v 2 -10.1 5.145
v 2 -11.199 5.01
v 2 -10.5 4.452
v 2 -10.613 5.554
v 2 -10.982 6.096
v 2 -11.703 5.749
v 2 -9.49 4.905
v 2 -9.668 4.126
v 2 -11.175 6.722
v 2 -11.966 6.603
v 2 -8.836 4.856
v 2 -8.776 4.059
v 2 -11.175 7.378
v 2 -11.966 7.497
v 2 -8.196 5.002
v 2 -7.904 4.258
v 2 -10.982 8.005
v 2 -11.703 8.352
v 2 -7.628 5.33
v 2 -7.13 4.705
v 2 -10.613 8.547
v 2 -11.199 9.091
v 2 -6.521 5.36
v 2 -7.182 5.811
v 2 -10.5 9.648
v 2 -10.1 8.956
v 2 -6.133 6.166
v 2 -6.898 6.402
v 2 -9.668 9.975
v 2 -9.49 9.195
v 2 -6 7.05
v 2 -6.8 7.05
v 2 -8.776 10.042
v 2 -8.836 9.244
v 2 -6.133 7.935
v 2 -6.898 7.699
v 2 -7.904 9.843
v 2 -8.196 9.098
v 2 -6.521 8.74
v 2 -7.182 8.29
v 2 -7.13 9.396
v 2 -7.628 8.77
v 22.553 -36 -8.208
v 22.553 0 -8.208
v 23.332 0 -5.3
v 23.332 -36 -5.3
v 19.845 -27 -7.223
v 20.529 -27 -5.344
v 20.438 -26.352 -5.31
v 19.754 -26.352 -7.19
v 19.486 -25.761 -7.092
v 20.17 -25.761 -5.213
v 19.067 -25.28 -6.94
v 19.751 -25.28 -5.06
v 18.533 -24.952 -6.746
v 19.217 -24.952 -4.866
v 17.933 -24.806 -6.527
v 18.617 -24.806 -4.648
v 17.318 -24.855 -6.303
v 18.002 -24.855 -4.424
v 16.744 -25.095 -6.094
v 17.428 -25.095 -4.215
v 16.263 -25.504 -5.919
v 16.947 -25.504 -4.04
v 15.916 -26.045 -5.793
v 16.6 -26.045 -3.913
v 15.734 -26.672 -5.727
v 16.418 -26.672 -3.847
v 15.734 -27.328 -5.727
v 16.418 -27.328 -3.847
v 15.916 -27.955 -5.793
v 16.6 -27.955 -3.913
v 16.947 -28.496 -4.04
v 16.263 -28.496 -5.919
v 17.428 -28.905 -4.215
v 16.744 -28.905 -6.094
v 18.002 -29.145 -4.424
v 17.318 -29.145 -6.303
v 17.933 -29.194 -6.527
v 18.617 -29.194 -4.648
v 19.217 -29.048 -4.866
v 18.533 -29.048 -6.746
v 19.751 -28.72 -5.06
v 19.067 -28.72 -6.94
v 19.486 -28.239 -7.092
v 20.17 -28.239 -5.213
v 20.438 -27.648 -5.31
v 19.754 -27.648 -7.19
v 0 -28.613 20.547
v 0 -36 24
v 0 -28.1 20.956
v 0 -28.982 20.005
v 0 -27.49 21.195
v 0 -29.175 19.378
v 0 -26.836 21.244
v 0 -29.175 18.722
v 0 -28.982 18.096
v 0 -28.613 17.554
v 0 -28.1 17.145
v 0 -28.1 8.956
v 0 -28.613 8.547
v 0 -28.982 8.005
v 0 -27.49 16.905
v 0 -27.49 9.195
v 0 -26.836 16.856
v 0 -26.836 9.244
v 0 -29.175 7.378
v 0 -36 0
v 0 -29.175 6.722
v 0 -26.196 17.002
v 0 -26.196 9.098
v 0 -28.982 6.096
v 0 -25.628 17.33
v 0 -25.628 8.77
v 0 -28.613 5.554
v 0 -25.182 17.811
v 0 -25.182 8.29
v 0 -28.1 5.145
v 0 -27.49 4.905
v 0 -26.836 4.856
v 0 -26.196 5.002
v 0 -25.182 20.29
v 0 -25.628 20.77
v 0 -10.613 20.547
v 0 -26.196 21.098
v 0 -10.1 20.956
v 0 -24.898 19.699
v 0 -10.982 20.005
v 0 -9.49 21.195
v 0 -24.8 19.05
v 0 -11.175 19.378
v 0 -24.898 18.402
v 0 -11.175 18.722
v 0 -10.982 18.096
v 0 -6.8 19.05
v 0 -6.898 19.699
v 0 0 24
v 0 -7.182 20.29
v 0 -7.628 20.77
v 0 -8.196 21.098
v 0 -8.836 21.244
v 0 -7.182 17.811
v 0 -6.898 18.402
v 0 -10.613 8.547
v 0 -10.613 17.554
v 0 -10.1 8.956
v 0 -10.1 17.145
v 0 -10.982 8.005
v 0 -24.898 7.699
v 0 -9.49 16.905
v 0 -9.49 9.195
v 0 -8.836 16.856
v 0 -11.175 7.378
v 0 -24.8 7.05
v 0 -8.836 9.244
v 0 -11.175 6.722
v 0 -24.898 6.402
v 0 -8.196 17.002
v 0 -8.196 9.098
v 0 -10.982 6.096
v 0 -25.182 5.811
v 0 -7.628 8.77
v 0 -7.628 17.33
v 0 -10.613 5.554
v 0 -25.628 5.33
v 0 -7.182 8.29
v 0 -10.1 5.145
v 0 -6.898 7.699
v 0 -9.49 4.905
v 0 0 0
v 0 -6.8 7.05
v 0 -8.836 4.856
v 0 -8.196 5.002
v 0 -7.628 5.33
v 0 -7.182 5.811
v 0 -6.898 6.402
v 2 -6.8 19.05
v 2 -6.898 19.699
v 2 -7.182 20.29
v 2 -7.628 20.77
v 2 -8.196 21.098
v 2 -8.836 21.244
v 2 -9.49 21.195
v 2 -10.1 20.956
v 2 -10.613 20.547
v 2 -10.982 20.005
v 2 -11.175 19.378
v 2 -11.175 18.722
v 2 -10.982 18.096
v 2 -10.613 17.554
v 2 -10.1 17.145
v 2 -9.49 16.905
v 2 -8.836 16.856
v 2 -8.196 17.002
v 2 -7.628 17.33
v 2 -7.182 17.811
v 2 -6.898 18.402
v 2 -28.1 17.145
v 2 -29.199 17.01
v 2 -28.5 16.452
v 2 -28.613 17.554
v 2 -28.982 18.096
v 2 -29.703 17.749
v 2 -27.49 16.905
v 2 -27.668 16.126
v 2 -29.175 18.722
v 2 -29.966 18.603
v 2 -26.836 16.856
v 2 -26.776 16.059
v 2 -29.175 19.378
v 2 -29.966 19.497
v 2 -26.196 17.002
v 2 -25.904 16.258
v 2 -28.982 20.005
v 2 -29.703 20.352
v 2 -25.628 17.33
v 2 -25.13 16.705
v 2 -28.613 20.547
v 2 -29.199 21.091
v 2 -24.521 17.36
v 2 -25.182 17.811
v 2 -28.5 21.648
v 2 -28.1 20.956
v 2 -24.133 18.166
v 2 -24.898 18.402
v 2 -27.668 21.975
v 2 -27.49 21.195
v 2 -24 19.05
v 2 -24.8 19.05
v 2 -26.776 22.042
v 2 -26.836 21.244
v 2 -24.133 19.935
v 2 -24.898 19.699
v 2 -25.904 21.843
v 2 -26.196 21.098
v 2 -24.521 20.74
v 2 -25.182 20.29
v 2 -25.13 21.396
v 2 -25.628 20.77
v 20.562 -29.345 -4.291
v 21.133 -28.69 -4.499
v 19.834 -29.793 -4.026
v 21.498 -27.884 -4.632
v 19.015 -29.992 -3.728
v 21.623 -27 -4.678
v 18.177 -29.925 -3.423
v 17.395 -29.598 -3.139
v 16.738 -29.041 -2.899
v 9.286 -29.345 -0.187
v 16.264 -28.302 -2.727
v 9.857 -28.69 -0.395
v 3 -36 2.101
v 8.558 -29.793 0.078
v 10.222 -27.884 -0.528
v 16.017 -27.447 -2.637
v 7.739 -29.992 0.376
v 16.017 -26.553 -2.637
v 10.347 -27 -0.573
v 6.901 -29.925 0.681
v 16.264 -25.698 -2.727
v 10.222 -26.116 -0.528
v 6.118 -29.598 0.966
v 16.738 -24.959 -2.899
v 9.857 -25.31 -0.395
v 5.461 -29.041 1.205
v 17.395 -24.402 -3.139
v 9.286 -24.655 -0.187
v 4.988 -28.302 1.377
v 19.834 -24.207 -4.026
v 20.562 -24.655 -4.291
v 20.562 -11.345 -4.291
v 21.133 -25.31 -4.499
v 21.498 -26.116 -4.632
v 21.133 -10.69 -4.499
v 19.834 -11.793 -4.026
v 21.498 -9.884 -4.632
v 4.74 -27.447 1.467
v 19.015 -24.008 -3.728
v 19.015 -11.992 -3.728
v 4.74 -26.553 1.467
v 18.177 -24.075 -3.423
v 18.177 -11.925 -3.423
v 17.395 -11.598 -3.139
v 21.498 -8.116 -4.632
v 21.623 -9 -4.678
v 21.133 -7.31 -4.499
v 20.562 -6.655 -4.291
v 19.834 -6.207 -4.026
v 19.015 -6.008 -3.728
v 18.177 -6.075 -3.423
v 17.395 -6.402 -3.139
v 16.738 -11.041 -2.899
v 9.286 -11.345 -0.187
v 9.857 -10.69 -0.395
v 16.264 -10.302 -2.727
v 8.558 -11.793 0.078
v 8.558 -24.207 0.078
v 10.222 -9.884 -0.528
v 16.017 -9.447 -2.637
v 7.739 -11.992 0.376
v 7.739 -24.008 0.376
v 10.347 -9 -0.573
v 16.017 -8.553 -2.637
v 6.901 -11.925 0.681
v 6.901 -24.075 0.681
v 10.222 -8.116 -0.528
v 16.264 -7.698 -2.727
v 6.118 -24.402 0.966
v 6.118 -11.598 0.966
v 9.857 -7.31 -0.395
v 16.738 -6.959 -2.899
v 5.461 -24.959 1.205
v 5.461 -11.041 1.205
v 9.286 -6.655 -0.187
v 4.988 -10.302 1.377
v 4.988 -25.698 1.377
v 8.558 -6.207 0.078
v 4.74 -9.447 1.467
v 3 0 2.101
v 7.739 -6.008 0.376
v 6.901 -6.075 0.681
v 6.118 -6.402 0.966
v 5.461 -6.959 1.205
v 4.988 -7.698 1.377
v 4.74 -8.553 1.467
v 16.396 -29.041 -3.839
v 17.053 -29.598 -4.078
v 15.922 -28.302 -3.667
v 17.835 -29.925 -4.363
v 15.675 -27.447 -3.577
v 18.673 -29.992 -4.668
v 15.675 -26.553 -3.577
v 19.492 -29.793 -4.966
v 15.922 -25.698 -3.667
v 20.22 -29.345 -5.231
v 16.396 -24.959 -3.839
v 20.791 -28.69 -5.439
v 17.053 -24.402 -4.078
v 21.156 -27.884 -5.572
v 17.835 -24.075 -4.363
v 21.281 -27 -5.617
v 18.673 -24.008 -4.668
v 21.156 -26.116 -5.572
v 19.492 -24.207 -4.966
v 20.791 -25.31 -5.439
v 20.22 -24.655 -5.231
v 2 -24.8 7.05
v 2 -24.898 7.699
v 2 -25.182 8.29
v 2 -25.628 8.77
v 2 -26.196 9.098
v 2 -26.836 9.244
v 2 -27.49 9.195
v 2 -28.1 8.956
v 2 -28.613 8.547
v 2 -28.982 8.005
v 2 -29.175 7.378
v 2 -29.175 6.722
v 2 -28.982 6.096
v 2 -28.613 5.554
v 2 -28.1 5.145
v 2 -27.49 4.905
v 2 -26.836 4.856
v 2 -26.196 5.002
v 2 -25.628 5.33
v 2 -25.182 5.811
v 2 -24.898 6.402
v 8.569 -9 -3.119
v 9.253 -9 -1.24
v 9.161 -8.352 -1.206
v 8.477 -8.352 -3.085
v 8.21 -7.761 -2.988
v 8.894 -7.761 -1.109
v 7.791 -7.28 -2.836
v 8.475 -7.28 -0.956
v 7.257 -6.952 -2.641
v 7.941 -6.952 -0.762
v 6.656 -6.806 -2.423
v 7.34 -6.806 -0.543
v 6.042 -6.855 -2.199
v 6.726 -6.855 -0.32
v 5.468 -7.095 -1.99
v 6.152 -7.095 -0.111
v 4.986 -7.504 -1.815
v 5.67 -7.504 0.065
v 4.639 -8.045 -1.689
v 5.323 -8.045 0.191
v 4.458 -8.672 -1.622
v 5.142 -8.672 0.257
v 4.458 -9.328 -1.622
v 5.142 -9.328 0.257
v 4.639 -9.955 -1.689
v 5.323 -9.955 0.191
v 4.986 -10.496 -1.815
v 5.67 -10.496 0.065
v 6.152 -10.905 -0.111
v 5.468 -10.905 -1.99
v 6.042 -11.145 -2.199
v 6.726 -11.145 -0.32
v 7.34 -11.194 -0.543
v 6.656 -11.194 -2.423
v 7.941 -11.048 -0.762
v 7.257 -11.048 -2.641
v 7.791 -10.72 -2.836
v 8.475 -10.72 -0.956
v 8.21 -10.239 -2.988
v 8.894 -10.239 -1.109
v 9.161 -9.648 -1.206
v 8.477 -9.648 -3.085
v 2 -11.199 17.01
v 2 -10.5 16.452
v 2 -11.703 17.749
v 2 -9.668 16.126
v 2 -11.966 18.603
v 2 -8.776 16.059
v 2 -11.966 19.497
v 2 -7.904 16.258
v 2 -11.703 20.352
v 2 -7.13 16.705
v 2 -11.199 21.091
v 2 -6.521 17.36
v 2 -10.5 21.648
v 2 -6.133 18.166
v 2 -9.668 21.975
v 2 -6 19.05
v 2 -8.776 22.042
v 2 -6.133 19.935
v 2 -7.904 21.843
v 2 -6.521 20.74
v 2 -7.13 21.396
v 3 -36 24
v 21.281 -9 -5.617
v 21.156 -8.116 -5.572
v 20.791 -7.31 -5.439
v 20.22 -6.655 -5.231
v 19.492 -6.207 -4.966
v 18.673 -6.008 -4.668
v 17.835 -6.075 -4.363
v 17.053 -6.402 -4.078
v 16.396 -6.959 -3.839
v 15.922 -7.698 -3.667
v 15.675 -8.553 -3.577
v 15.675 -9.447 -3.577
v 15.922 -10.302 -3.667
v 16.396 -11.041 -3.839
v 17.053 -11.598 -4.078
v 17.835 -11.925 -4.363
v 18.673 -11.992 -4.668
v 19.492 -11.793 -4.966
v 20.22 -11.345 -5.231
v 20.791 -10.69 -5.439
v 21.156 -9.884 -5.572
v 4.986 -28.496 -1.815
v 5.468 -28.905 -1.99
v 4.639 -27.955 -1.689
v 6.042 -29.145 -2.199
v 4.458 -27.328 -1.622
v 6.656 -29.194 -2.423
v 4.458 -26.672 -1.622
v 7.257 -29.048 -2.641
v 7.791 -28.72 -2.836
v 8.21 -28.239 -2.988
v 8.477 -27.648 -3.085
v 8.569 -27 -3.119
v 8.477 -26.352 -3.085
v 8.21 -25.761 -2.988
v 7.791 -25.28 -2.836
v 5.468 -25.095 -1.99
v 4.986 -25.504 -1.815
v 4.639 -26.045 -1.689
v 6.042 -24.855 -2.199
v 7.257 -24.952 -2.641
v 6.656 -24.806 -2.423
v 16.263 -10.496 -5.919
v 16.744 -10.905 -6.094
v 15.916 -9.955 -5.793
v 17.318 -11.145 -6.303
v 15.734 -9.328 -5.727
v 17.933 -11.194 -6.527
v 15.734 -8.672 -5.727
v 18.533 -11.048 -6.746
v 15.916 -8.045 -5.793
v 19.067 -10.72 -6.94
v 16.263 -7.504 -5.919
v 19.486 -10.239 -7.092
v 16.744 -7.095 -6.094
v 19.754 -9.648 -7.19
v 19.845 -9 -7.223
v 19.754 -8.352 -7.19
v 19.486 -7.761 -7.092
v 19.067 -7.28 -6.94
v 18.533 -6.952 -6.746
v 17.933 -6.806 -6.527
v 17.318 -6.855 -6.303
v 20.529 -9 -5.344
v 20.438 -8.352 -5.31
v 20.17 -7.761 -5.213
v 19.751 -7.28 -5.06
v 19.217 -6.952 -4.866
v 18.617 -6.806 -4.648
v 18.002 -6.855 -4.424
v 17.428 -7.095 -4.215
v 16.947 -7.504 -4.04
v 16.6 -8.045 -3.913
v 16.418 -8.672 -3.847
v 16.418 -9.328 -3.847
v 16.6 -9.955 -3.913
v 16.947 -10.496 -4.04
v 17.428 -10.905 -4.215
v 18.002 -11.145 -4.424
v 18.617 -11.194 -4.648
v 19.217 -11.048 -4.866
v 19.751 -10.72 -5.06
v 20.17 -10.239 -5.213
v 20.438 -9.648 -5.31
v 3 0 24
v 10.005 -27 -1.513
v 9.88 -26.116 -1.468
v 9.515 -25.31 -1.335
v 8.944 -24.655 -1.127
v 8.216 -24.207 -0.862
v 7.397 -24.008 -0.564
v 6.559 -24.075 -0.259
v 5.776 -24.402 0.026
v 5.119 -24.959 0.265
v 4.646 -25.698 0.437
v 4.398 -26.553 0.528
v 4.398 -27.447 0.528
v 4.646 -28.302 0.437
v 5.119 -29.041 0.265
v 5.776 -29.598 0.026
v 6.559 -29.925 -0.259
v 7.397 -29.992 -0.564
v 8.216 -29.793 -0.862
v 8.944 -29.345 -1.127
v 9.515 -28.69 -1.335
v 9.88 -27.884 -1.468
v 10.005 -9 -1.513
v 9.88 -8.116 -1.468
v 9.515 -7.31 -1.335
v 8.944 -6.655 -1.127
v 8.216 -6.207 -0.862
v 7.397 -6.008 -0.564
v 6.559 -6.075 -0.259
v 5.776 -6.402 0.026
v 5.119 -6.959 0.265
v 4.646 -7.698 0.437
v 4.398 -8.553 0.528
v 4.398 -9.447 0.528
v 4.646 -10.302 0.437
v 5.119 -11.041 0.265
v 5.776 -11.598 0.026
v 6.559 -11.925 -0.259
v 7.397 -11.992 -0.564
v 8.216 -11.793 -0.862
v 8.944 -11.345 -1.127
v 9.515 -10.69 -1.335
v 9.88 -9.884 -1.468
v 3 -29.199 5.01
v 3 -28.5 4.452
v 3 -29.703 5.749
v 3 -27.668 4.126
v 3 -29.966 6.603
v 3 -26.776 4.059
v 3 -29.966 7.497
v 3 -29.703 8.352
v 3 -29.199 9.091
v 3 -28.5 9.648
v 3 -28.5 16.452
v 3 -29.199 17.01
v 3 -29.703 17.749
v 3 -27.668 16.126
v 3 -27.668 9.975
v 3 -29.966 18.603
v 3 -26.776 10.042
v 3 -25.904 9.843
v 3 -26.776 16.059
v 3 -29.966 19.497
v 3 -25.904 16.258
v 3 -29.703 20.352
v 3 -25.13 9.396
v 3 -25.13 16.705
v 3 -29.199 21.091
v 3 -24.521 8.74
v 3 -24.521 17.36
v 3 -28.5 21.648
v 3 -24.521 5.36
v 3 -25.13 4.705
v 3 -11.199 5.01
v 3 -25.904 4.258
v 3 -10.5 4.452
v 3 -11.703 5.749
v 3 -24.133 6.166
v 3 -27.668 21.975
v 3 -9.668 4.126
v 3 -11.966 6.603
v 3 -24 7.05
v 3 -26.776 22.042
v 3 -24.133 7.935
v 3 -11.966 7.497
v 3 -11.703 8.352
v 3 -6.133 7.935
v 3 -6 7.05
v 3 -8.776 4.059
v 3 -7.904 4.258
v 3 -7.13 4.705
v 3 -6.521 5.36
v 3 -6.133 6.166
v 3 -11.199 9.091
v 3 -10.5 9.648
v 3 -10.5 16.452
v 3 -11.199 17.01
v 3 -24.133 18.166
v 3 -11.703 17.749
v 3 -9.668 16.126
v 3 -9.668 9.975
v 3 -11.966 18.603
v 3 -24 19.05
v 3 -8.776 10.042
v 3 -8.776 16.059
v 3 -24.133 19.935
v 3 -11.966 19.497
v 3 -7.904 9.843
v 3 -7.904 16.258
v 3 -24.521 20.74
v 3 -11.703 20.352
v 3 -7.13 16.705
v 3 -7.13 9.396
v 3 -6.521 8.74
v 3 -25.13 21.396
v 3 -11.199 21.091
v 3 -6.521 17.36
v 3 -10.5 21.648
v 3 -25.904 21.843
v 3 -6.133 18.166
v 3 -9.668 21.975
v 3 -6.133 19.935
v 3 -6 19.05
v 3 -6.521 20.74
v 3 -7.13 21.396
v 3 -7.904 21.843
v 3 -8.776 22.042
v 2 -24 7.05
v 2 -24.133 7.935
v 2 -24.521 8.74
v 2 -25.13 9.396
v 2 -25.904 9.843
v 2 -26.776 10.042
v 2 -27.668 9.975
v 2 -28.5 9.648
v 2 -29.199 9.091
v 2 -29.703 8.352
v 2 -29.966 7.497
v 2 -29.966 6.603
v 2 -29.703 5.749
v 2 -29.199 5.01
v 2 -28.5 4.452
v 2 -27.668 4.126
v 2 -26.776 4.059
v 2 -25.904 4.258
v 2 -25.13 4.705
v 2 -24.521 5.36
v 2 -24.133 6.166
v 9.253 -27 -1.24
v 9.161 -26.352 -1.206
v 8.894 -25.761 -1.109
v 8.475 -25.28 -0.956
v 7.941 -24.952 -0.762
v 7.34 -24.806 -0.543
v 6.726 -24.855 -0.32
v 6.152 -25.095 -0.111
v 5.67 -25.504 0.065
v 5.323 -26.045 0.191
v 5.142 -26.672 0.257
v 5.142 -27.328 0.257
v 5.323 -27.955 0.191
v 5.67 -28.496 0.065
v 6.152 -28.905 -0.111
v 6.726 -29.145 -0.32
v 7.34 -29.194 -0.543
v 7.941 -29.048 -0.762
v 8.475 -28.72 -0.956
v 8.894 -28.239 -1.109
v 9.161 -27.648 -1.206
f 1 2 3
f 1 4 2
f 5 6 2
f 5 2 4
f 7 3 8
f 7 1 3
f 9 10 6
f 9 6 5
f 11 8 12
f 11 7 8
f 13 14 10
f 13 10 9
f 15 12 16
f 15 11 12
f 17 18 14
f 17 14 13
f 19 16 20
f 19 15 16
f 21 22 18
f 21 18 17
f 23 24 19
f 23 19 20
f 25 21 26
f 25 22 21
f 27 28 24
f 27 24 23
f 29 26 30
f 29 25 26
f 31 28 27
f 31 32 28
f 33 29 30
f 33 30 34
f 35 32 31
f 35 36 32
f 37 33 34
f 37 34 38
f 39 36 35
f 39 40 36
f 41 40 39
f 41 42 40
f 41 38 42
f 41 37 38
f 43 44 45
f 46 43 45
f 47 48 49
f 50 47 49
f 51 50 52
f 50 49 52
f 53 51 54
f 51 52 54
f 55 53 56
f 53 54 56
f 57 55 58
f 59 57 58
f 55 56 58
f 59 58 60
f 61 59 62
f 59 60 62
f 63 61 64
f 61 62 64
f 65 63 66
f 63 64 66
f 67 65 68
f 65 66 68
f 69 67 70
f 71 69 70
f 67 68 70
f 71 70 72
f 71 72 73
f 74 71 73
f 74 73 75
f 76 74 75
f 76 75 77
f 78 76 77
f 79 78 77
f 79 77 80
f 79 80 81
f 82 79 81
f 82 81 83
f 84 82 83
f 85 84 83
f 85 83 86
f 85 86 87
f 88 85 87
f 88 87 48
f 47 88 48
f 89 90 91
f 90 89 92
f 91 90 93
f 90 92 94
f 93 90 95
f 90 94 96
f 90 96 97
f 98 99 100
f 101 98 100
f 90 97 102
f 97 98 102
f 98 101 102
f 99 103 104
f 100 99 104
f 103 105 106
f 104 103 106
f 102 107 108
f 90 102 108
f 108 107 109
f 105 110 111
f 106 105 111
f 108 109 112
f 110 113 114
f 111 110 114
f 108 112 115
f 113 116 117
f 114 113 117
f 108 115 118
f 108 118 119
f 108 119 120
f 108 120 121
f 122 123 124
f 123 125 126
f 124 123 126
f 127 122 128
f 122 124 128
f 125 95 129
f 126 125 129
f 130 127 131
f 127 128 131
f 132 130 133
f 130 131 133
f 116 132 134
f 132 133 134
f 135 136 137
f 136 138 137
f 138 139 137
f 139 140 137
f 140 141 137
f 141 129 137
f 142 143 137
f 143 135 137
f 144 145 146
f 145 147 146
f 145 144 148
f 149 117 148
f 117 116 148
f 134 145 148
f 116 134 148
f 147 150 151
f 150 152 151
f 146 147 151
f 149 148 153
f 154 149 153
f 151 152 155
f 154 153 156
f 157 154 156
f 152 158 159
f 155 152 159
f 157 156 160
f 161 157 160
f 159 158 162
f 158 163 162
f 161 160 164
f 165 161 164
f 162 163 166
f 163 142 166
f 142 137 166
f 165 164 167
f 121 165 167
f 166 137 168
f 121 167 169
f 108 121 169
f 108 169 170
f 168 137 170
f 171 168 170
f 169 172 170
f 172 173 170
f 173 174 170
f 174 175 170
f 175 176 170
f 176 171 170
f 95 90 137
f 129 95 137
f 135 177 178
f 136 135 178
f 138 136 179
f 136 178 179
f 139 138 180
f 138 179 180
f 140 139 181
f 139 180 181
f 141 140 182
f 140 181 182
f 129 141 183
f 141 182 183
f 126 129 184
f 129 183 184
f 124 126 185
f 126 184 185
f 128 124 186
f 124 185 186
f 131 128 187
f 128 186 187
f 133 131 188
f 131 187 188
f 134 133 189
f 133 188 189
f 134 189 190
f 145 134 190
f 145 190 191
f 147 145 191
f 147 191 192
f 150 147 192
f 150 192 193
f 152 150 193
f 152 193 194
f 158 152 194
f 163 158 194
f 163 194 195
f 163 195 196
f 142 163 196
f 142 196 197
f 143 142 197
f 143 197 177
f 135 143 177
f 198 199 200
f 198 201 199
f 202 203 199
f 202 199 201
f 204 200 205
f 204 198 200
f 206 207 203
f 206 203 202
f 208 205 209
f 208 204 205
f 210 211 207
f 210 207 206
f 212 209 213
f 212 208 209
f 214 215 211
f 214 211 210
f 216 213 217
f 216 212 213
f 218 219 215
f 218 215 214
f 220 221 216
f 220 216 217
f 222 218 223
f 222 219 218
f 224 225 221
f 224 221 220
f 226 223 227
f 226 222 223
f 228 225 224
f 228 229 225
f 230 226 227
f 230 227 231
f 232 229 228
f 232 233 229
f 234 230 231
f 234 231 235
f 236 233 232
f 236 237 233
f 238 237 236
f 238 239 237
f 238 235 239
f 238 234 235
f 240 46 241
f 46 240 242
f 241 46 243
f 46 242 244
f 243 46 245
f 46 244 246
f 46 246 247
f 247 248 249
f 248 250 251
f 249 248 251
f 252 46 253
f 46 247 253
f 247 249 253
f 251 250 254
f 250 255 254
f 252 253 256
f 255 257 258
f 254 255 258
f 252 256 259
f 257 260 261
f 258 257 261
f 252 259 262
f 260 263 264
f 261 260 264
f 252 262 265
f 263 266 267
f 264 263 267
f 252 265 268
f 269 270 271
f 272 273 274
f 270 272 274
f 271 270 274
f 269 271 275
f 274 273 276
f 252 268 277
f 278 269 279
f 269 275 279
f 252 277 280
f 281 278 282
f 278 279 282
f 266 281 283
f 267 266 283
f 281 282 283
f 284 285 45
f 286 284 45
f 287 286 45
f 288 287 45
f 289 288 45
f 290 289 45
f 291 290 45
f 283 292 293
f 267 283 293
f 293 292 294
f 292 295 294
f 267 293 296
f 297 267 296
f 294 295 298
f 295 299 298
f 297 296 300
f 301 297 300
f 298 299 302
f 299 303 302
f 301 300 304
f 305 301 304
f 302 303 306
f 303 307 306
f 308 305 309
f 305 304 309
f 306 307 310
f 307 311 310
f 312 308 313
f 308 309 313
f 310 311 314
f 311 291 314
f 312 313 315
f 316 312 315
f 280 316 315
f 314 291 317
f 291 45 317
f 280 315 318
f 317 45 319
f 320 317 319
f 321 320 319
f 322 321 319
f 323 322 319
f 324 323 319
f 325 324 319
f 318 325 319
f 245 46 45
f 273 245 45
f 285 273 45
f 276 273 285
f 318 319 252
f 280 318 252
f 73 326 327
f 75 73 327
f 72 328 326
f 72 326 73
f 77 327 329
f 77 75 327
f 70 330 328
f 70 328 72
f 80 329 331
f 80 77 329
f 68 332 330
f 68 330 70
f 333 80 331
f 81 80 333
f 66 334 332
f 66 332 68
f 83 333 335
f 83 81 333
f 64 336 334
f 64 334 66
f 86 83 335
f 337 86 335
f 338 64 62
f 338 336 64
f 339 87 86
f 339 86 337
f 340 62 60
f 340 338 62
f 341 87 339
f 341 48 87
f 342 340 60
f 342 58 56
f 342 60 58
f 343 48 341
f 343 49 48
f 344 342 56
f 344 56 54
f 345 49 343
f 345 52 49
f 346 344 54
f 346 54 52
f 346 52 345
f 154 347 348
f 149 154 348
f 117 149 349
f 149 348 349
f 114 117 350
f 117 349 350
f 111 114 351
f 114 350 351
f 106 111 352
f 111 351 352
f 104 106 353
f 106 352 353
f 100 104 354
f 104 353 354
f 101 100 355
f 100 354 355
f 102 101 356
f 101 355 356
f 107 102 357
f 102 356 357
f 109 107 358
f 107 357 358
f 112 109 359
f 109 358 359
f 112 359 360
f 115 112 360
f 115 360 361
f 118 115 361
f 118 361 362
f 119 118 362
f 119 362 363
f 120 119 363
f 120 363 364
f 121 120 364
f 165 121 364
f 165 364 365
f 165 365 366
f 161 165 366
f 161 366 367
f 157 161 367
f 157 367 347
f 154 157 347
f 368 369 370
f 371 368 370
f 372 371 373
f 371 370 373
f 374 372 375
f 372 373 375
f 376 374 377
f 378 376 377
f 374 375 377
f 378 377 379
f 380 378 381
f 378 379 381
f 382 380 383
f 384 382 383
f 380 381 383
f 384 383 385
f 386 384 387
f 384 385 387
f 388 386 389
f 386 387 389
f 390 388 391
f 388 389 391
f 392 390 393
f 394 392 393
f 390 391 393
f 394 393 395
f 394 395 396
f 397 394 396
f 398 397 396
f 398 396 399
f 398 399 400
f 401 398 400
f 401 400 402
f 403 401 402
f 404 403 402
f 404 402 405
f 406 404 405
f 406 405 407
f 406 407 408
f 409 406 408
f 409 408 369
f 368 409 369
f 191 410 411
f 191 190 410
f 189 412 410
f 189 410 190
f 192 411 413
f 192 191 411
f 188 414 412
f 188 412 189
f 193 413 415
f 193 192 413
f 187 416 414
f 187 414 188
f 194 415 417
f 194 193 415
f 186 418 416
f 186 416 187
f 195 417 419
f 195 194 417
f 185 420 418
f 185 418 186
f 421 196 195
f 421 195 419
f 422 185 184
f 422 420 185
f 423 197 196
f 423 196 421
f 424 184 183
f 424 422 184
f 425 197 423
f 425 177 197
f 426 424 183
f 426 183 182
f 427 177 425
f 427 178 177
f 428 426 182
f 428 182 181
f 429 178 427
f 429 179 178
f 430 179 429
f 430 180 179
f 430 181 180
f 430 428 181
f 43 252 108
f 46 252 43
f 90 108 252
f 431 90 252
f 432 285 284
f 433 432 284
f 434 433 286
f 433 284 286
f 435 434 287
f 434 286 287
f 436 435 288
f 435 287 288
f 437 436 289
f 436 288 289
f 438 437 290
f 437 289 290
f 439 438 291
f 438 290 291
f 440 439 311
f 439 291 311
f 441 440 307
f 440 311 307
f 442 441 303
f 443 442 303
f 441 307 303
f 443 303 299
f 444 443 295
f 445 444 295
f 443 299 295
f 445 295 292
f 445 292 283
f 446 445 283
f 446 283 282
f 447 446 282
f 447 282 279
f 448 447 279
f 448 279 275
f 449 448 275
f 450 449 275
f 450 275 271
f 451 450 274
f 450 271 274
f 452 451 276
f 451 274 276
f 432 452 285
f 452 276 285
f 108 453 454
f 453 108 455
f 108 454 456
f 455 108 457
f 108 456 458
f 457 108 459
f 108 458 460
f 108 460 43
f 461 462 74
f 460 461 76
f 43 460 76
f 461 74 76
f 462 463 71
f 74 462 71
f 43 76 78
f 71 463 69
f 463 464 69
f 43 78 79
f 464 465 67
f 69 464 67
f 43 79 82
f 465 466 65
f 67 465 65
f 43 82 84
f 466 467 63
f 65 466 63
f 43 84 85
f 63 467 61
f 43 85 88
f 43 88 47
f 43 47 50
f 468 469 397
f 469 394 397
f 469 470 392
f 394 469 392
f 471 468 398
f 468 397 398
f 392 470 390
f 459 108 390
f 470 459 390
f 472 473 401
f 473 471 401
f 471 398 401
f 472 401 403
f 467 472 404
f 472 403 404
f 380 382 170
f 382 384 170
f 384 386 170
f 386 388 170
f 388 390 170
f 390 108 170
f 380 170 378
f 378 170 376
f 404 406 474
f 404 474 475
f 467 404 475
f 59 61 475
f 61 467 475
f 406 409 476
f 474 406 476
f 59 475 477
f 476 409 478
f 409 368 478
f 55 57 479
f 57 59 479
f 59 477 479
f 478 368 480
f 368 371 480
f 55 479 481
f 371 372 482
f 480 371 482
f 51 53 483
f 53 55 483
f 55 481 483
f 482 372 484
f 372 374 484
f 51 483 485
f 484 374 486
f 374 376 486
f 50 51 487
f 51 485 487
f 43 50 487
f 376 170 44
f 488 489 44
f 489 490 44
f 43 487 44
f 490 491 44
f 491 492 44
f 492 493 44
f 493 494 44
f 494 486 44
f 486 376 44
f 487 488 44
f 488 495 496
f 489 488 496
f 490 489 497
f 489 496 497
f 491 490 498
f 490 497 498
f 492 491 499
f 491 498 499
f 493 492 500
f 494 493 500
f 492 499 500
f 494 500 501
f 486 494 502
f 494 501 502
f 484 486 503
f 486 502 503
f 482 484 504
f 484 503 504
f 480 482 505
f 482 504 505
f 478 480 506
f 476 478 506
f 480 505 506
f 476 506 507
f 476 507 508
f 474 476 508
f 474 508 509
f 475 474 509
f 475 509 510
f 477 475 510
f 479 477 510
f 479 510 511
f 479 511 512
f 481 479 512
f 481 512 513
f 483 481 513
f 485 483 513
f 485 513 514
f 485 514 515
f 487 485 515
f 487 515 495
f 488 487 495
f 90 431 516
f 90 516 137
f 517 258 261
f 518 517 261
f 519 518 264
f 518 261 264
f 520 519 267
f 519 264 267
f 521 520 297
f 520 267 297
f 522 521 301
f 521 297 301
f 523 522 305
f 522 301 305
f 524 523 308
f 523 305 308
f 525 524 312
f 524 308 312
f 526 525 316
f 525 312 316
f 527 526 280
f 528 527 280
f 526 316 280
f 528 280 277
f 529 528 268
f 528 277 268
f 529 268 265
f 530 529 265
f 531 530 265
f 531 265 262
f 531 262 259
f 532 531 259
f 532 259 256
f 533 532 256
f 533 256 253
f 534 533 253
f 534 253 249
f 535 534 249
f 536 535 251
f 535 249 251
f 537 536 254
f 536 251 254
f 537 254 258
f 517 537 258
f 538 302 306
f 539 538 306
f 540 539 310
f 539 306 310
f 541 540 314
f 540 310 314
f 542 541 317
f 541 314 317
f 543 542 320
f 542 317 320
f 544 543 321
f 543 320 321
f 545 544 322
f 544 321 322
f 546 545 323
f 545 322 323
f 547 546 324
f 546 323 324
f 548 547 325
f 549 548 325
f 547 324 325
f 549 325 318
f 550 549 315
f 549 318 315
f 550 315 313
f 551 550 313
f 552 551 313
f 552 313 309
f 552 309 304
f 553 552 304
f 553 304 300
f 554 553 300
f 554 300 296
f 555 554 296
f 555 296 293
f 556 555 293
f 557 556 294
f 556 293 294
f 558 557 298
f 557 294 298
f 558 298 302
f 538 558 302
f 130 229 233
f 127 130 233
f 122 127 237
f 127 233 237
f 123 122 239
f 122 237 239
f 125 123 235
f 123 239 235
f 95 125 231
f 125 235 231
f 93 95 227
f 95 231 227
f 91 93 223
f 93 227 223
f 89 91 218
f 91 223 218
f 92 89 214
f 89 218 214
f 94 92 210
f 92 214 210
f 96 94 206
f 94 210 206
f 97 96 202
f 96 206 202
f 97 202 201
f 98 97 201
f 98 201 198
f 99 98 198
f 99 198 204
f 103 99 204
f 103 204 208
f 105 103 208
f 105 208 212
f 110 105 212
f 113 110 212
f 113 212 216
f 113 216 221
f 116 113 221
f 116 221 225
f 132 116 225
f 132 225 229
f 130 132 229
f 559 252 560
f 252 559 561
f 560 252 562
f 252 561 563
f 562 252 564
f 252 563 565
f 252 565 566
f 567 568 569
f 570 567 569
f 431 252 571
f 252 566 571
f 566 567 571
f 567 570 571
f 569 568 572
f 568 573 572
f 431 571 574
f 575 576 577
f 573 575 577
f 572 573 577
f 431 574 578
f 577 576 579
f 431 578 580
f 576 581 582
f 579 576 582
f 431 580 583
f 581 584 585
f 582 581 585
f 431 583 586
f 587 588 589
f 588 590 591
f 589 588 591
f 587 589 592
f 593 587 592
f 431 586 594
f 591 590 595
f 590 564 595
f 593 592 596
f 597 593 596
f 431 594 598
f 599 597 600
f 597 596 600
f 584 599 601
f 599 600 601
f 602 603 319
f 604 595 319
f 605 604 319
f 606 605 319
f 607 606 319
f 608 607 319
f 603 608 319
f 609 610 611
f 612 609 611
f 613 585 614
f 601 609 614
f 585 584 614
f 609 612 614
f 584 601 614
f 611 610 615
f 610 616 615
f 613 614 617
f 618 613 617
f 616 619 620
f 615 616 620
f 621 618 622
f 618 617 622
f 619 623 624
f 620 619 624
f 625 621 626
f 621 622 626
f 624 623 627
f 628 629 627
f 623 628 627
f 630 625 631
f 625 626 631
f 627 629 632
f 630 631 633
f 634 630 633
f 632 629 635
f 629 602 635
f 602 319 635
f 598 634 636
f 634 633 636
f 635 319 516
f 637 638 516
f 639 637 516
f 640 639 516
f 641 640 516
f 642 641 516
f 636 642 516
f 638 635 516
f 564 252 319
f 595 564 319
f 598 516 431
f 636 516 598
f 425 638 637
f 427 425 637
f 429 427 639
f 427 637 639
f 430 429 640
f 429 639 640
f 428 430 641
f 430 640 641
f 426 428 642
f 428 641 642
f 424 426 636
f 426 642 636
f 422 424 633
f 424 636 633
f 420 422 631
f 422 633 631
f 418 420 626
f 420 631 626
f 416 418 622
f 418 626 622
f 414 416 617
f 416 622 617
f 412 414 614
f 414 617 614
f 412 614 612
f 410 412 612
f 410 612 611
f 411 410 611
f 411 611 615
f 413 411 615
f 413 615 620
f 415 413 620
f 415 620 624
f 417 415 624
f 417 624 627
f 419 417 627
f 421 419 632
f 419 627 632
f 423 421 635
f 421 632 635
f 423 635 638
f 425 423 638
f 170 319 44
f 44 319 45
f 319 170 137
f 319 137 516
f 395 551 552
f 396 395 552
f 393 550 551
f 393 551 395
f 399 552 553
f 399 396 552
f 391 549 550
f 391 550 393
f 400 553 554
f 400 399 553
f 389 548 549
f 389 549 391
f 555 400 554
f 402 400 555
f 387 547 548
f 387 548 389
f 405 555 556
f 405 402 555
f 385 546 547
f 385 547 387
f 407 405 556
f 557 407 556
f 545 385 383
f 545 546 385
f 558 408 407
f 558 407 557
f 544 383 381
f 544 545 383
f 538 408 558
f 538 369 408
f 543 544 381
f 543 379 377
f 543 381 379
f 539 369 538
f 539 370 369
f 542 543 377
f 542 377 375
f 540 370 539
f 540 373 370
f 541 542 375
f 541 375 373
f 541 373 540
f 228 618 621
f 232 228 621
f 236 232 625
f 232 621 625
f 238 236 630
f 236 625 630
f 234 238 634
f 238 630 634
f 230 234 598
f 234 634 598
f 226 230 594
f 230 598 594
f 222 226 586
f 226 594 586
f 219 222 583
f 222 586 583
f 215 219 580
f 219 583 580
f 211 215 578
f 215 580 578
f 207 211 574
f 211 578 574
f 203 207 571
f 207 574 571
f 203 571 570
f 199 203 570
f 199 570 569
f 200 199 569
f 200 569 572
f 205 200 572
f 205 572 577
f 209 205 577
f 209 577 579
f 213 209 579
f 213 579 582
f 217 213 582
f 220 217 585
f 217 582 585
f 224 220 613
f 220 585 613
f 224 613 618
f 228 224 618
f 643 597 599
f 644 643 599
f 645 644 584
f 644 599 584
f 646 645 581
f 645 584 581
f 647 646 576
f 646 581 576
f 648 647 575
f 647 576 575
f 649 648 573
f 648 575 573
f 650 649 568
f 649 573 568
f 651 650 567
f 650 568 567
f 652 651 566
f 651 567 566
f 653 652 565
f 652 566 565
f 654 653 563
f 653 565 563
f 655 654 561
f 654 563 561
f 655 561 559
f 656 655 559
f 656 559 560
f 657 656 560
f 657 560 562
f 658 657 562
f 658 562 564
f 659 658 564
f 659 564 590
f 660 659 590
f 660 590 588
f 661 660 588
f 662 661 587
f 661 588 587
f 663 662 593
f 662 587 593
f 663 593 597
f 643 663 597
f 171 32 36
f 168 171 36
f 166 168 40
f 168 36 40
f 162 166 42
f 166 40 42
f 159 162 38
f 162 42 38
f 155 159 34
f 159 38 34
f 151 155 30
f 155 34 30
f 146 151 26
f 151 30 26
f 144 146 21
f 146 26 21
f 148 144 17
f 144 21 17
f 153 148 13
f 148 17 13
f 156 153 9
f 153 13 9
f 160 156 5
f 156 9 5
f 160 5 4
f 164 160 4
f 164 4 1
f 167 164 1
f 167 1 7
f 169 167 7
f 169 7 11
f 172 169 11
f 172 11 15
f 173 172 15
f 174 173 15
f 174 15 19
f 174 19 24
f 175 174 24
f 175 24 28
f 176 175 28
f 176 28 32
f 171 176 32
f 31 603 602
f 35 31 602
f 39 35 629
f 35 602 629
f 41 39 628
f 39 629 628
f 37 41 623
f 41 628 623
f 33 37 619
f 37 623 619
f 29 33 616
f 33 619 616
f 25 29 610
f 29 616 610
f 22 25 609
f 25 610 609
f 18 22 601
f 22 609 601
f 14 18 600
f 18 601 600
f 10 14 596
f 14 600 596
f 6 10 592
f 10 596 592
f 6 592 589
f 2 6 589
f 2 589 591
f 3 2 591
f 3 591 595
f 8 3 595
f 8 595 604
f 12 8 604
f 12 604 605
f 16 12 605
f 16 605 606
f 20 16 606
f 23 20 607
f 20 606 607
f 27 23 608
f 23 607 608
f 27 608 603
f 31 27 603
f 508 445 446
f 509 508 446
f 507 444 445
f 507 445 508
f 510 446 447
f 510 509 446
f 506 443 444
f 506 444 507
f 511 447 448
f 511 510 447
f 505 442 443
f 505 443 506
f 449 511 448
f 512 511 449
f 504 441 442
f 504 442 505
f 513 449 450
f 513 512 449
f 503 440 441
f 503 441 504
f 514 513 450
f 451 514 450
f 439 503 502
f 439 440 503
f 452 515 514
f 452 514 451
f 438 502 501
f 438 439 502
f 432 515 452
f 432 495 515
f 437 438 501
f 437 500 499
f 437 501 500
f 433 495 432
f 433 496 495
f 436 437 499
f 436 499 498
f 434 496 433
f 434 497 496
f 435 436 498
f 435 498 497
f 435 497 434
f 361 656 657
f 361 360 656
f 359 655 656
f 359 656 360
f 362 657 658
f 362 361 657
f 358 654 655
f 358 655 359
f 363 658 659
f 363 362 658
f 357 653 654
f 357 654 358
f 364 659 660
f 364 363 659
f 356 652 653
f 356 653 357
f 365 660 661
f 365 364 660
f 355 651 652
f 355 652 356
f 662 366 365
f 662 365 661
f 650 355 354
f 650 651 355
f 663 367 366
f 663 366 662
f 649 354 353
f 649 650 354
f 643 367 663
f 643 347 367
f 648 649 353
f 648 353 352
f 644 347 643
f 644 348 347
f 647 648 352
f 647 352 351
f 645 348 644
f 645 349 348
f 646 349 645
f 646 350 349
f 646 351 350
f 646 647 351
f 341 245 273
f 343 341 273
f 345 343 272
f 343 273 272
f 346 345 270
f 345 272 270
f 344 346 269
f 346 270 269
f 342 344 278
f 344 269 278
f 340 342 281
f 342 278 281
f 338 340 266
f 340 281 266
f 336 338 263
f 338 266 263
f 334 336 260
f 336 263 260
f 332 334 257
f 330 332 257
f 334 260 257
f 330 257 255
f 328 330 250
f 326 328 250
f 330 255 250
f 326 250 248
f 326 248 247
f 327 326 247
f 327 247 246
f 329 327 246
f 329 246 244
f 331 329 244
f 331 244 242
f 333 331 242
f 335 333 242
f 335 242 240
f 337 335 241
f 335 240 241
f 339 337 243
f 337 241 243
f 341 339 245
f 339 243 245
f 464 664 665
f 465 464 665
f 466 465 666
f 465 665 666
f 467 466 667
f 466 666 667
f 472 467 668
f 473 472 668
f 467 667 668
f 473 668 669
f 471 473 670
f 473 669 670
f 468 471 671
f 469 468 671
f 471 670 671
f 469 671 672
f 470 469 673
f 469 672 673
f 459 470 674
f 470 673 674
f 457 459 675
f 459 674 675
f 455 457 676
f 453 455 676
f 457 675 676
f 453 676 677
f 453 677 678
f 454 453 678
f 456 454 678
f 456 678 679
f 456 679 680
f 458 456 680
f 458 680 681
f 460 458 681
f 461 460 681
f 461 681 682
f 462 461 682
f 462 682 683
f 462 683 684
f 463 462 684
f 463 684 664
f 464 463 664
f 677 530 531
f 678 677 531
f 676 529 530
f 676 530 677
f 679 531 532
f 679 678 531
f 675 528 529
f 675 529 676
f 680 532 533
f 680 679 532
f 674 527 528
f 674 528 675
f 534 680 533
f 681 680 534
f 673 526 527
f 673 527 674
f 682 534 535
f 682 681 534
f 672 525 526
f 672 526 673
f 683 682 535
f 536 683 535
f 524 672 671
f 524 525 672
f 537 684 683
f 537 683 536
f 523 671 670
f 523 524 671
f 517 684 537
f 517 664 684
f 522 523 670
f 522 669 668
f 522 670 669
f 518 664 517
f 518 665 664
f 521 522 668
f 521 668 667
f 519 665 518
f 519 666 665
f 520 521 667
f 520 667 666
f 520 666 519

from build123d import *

# Parameters (mm, degrees)
F1_DEPTH = 36
F2_R     = 2.2
F4_DEPTH = 3.001
F3_R     = 2.2
F5_DEPTH = 10.7144513162
F3_R_2   = 3
F6_DEPTH = 1
F2_R_2   = 3
F7_DEPTH = 1


with BuildPart() as f1:
    # F0 (on Front) → F1 (new body)
    with BuildSketch(Plane.XZ):
        Polygon((0, 24), (0, 0), (22.5526228989, -8.2084834398), (23.3320459743, -5.2996369217), (3, 2.1006226146), (3, 24), align=None)
    extrude(amount=F1_DEPTH)

    # F2 (on face) → F4 (cut, through all)
    with BuildSketch(Plane.YZ.offset(3)):
        with Locations((-27, 19.0503113073)):
            Circle(F2_R)
        with Locations((-27, 7.0503113073)):
            Circle(F2_R)
        with Locations((-9, 7.0503113073)):
            Circle(F2_R)
        with Locations((-9, 19.0503113073)):
            Circle(F2_R)
    extrude(amount=-F4_DEPTH, mode=Mode.SUBTRACT)

    # F3 (on face) → F5 (cut, through all)
    with BuildSketch(Plane(origin=(1.02606043, 0, 2.8190778624), x_dir=(0.9396926208, 0, -0.3420201433), z_dir=(0.3420201433, 0, 0.9396926208))):
        with Locations((6.919078312, -27)):
            Circle(F3_R)
        with Locations((18.919078312, -27)):
            Circle(F3_R)
        with Locations((6.919078312, -9)):
            Circle(F3_R)
        with Locations((18.919078312, -9)):
            Circle(F3_R)
    extrude(amount=-F5_DEPTH, mode=Mode.SUBTRACT)

    # F3 (on face) → F6 (cut)
    with BuildSketch(Plane(origin=(1.02606043, 0, 2.8190778624), x_dir=(0.9396926208, 0, -0.3420201433), z_dir=(0.3420201433, 0, 0.9396926208))):
        with Locations((6.919078312, -27)):
            Circle(F3_R_2)
        with Locations((6.919078312, -27)):
            Circle(F3_R, mode=Mode.SUBTRACT)
        with Locations((18.919078312, -27)):
            Circle(F3_R_2)
        with Locations((18.919078312, -27)):
            Circle(F3_R, mode=Mode.SUBTRACT)
        with Locations((18.919078312, -9)):
            Circle(F3_R_2)
        with Locations((18.919078312, -9)):
            Circle(F3_R, mode=Mode.SUBTRACT)
        with Locations((6.919078312, -9)):
            Circle(F3_R_2)
        with Locations((6.919078312, -9)):
            Circle(F3_R, mode=Mode.SUBTRACT)
    extrude(amount=-F6_DEPTH, mode=Mode.SUBTRACT)

    # F2 (on face) → F7 (cut)
    with BuildSketch(Plane.YZ.offset(3)):
        with Locations((-27, 19.0503113073)):
            Circle(F2_R_2)
        with Locations((-27, 19.0503113073)):
            Circle(F2_R, mode=Mode.SUBTRACT)
        with Locations((-9, 7.0503113073)):
            Circle(F2_R_2)
        with Locations((-9, 7.0503113073)):
            Circle(F2_R, mode=Mode.SUBTRACT)
        with Locations((-9, 19.0503113073)):
            Circle(F2_R_2)
        with Locations((-9, 19.0503113073)):
            Circle(F2_R, mode=Mode.SUBTRACT)
        with Locations((-27, 7.0503113073)):
            Circle(F2_R_2)
        with Locations((-27, 7.0503113073)):
            Circle(F2_R, mode=Mode.SUBTRACT)
    extrude(amount=-F7_DEPTH, mode=Mode.SUBTRACT)


solid = f1.part
